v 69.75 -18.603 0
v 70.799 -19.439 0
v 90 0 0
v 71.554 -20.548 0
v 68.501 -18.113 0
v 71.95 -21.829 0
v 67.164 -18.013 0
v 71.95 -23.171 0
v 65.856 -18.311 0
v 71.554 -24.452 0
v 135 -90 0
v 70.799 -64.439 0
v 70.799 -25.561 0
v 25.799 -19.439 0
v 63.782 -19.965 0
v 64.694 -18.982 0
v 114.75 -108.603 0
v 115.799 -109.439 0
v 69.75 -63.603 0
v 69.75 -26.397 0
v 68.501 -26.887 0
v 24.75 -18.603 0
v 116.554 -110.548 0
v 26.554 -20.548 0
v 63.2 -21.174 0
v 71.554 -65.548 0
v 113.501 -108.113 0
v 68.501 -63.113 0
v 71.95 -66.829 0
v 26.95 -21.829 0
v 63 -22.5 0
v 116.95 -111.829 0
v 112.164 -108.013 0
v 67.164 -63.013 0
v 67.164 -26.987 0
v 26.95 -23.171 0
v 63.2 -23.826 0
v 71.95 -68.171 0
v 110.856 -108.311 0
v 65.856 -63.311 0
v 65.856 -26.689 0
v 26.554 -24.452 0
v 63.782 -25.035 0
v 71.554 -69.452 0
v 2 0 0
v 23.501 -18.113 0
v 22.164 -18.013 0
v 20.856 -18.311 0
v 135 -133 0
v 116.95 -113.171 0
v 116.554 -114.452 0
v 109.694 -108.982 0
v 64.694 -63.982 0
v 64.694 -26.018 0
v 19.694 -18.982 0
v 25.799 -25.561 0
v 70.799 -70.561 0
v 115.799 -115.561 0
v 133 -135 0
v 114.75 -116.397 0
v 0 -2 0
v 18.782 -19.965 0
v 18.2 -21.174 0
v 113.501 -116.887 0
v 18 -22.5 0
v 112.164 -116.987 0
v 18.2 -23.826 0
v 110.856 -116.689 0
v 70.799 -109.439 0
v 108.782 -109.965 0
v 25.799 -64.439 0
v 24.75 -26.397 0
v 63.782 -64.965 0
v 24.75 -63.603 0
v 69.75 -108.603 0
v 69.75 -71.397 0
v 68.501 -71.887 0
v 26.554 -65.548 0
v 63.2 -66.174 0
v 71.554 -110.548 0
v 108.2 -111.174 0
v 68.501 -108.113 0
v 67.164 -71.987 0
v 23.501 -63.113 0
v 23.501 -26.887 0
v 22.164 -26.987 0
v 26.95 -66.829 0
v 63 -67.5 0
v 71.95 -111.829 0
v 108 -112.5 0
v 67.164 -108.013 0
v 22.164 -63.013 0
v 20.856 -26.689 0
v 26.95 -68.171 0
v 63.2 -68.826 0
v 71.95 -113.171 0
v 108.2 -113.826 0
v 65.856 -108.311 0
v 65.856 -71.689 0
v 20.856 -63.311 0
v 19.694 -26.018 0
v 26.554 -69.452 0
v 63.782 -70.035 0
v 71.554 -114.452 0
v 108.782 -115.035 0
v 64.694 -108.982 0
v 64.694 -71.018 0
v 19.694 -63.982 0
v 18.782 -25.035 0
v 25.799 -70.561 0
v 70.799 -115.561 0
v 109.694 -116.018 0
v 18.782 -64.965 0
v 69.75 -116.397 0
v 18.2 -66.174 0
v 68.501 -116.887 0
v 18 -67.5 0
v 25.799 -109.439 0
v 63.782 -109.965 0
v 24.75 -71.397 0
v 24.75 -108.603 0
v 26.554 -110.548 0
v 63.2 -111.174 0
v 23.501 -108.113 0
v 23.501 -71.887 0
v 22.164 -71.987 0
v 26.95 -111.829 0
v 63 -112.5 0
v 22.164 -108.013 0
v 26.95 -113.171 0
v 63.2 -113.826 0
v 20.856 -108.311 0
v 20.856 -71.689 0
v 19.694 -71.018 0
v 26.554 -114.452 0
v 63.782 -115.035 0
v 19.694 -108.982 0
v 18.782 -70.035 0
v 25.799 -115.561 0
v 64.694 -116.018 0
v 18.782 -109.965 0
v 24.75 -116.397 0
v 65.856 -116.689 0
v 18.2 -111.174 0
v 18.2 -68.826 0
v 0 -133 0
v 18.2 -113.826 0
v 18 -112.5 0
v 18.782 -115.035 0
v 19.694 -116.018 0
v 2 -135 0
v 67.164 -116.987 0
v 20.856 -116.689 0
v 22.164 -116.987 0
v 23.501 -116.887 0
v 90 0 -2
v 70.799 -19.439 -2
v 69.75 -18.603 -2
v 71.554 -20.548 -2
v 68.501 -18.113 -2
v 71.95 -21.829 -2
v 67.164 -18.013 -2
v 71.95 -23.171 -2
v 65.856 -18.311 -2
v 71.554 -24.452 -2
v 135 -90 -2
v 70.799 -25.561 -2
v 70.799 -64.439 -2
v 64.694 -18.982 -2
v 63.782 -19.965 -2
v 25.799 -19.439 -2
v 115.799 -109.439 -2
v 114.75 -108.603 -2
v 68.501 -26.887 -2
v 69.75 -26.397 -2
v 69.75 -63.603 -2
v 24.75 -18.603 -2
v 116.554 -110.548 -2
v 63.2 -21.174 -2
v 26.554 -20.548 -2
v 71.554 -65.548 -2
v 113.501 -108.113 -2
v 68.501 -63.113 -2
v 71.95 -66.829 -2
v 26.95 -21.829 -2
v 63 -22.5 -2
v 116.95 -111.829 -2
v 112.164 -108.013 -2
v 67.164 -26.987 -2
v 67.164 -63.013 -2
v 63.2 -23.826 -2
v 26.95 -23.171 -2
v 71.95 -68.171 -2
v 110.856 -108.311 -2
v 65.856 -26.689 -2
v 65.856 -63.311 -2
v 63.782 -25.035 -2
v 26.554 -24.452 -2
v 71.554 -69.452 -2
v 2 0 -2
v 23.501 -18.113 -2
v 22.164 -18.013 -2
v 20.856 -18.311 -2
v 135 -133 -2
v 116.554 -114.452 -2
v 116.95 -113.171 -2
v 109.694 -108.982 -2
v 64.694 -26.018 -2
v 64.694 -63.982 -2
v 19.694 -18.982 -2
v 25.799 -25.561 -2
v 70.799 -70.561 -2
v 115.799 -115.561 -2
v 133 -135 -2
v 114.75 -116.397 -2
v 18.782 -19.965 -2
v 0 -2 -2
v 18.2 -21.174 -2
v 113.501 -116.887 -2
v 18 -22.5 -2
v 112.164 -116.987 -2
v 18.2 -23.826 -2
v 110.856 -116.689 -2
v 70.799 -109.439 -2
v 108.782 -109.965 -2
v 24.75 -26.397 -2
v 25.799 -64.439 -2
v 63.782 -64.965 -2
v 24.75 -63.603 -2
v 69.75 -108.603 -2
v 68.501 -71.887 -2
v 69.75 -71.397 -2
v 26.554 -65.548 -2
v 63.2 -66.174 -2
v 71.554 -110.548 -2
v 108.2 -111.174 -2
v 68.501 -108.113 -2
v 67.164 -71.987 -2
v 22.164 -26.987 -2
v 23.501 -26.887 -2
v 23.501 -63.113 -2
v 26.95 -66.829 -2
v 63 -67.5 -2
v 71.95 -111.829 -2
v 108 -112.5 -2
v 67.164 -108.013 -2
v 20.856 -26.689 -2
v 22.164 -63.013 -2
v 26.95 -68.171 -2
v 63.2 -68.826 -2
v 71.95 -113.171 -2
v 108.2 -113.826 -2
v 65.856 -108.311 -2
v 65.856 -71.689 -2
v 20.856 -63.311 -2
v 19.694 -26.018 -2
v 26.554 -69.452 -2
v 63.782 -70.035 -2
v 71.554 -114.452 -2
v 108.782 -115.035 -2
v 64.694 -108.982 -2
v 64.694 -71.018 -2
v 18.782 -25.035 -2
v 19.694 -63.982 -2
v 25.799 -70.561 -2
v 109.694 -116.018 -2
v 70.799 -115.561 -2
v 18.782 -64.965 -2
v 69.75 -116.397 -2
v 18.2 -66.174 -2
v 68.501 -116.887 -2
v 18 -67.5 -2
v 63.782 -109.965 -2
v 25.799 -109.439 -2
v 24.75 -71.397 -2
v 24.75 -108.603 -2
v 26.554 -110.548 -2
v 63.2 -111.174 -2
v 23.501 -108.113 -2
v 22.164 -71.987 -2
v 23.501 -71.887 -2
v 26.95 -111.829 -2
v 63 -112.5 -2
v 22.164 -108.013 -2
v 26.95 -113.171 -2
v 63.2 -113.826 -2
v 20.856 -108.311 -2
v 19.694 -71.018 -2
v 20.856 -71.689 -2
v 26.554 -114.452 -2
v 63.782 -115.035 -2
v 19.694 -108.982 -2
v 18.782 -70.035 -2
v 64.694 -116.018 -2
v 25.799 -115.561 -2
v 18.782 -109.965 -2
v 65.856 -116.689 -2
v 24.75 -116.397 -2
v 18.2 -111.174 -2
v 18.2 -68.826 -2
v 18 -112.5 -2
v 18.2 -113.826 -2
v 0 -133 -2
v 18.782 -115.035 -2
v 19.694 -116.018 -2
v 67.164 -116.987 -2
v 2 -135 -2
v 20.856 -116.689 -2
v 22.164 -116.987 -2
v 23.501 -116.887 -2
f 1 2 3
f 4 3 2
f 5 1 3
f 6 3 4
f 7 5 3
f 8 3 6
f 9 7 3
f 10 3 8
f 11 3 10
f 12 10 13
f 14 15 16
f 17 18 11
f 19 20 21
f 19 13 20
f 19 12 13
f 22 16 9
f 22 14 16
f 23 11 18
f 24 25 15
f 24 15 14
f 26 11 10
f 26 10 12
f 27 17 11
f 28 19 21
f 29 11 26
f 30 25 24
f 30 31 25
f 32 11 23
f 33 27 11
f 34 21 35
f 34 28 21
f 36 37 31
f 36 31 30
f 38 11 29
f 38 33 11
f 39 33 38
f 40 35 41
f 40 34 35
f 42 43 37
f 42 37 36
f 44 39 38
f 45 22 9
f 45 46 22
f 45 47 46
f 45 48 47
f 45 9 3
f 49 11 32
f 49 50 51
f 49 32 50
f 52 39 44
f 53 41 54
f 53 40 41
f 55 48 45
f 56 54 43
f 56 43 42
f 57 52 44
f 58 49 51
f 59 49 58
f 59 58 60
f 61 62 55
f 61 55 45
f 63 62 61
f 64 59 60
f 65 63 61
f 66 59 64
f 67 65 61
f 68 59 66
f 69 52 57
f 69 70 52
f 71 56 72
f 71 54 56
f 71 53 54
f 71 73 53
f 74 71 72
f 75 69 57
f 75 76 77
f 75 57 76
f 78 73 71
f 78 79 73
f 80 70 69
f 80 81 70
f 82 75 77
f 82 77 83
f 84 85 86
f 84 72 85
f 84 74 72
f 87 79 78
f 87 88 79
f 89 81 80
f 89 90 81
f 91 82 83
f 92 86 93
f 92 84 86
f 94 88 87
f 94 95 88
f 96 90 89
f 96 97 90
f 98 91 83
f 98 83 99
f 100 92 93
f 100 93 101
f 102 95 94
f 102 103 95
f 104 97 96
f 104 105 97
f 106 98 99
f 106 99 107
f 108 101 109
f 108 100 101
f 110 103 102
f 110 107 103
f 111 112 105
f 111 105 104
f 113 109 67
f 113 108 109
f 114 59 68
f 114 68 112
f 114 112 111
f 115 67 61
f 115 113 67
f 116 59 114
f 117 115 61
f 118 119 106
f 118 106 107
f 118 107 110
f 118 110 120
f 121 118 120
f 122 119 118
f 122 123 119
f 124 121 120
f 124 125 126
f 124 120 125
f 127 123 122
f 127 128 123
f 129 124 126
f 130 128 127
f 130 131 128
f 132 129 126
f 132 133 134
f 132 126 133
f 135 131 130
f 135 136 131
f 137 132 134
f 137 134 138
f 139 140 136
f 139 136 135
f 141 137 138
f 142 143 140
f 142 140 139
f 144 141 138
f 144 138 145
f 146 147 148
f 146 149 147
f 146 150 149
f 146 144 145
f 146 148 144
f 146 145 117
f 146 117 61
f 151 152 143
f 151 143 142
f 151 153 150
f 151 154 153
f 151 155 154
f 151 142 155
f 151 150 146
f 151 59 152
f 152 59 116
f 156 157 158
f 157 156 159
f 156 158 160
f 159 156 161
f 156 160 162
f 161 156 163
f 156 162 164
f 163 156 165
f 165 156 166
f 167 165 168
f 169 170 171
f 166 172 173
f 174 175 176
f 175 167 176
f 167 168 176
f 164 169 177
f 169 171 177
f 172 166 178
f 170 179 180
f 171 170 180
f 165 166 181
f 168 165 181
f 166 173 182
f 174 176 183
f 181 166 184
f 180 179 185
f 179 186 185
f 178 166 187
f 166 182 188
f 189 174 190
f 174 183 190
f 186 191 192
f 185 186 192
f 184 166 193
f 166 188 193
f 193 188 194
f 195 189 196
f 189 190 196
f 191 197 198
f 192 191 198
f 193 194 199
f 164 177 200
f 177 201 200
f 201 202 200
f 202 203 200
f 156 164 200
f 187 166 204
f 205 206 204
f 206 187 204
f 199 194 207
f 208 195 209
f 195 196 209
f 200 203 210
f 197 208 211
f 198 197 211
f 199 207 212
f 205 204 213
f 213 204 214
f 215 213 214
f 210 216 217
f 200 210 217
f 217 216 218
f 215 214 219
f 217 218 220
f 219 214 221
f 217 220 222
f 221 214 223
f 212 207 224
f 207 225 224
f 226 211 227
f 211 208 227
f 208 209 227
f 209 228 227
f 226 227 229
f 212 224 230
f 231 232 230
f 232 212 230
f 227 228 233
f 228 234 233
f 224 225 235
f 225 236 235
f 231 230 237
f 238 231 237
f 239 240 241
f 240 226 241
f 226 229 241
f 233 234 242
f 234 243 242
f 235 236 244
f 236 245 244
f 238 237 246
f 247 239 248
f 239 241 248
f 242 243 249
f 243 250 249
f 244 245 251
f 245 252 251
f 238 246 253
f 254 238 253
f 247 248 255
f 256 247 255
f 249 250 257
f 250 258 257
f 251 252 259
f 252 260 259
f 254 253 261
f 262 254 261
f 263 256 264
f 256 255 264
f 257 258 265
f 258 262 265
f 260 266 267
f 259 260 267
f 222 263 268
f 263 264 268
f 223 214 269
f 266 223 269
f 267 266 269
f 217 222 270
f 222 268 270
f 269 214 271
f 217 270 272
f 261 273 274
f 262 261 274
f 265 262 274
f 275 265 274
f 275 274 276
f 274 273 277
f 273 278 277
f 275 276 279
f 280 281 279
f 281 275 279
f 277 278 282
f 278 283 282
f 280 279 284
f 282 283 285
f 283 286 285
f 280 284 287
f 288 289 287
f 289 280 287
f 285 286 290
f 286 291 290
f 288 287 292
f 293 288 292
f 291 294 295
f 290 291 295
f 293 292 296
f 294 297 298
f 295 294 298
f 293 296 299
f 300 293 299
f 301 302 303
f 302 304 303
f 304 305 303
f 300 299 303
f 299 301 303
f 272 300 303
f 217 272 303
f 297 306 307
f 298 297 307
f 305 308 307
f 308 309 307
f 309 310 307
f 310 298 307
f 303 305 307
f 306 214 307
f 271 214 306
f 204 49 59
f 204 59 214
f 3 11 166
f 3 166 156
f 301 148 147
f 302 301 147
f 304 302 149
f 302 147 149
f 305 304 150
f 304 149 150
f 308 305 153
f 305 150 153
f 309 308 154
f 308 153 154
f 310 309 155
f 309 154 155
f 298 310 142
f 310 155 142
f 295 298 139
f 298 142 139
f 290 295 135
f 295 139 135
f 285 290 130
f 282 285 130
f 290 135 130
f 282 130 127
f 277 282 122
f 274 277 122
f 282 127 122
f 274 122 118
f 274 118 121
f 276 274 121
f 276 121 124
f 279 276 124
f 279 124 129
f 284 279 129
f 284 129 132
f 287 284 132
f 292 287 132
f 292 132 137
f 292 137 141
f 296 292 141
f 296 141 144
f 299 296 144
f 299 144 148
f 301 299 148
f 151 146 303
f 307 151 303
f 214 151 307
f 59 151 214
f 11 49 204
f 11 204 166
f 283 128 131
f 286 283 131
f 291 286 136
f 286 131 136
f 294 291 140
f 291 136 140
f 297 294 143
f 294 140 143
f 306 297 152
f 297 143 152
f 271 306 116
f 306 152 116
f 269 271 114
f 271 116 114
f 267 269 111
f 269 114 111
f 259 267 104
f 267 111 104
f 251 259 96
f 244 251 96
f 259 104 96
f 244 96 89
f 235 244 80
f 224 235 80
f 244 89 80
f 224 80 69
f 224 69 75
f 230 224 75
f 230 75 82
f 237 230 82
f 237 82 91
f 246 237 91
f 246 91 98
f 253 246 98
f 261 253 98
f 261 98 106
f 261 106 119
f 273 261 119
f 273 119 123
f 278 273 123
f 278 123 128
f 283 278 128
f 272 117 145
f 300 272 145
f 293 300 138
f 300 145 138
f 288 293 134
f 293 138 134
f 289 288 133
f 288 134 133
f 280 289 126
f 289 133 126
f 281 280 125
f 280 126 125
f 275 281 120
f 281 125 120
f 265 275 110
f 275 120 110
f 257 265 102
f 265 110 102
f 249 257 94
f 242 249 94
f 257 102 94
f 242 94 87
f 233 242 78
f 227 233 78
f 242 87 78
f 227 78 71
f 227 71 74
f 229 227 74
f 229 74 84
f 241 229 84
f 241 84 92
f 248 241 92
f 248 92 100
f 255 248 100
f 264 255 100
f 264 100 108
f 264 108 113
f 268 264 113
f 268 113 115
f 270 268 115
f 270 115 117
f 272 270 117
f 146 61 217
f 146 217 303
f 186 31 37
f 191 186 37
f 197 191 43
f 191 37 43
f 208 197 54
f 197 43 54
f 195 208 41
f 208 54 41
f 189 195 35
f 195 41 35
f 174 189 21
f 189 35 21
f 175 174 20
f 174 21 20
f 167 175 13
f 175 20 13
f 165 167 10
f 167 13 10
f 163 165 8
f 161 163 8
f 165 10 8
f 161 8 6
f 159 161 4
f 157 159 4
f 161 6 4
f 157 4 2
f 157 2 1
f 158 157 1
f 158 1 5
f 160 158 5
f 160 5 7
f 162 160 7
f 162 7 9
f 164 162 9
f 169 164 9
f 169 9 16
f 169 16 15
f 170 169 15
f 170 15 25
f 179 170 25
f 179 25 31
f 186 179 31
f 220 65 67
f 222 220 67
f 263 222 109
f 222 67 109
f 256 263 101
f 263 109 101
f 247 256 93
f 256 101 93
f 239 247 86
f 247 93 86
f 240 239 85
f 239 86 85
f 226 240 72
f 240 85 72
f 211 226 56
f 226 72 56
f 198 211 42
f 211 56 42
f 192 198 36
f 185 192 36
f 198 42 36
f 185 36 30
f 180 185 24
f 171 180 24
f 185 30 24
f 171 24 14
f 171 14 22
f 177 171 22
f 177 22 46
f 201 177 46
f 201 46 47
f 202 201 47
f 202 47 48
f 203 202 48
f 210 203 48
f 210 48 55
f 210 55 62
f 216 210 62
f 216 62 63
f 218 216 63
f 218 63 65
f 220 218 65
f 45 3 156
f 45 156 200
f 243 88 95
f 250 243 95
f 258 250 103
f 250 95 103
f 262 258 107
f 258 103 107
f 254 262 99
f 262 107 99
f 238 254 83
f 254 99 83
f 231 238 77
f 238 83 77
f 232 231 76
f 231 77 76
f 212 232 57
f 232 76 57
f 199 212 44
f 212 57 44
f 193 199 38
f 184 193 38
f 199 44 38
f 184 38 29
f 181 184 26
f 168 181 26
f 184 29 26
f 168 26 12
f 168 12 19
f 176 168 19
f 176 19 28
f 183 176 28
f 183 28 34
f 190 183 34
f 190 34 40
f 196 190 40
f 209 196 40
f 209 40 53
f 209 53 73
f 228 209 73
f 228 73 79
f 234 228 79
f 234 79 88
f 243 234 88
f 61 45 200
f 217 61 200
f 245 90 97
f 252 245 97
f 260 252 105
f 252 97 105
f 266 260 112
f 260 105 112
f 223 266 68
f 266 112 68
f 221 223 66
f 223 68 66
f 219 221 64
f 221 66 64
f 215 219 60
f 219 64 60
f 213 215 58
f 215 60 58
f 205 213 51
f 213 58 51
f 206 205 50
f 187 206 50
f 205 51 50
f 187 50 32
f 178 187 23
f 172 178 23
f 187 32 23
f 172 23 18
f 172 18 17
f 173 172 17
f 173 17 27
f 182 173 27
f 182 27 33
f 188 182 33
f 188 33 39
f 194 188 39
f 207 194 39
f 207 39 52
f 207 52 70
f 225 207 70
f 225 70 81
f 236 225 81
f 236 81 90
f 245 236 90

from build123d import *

# Parameters (mm, degrees)
EXTRUDE_1_DEPTH   = 2
HOLE_WIZARD_M81_D = 9
CHAMFER_1_SIZE    = 2


with BuildPart() as part:
    # Эскиз1 → Бобышка-Вытянуть1 (new body)
    with BuildSketch(Plane(origin=(0, 0, 0), x_dir=(1, 0, 0), z_dir=(0, 0, -1))):
        Polygon((0, 0), (0, 135), (135, 135), (135, 90), (90, 0), align=None)
    extrude(amount=EXTRUDE_1_DEPTH)

    # Отверстие с зазором M81 (through all)
    with Locations(Plane(origin=(0, 0, -2), x_dir=(1, 0, 0), z_dir=(0, 0, -1))):
        with Locations((67.5, 112.5), (22.5, 112.5), (22.5, 67.5), (22.5, 22.5), (112.5, 112.5), (67.5, 67.5), (67.5, 22.5)):
            Hole(HOLE_WIZARD_M81_D / 2)

    # Фаска1
    chamfer_1_edges = [part.edges().sort_by_distance(p)[0] for p in [
        (0, 0, -1),
        (0, -135, -1),
        (135, -135, -1),
    ]]
    chamfer(chamfer_1_edges, length=CHAMFER_1_SIZE)


solid = part.part
